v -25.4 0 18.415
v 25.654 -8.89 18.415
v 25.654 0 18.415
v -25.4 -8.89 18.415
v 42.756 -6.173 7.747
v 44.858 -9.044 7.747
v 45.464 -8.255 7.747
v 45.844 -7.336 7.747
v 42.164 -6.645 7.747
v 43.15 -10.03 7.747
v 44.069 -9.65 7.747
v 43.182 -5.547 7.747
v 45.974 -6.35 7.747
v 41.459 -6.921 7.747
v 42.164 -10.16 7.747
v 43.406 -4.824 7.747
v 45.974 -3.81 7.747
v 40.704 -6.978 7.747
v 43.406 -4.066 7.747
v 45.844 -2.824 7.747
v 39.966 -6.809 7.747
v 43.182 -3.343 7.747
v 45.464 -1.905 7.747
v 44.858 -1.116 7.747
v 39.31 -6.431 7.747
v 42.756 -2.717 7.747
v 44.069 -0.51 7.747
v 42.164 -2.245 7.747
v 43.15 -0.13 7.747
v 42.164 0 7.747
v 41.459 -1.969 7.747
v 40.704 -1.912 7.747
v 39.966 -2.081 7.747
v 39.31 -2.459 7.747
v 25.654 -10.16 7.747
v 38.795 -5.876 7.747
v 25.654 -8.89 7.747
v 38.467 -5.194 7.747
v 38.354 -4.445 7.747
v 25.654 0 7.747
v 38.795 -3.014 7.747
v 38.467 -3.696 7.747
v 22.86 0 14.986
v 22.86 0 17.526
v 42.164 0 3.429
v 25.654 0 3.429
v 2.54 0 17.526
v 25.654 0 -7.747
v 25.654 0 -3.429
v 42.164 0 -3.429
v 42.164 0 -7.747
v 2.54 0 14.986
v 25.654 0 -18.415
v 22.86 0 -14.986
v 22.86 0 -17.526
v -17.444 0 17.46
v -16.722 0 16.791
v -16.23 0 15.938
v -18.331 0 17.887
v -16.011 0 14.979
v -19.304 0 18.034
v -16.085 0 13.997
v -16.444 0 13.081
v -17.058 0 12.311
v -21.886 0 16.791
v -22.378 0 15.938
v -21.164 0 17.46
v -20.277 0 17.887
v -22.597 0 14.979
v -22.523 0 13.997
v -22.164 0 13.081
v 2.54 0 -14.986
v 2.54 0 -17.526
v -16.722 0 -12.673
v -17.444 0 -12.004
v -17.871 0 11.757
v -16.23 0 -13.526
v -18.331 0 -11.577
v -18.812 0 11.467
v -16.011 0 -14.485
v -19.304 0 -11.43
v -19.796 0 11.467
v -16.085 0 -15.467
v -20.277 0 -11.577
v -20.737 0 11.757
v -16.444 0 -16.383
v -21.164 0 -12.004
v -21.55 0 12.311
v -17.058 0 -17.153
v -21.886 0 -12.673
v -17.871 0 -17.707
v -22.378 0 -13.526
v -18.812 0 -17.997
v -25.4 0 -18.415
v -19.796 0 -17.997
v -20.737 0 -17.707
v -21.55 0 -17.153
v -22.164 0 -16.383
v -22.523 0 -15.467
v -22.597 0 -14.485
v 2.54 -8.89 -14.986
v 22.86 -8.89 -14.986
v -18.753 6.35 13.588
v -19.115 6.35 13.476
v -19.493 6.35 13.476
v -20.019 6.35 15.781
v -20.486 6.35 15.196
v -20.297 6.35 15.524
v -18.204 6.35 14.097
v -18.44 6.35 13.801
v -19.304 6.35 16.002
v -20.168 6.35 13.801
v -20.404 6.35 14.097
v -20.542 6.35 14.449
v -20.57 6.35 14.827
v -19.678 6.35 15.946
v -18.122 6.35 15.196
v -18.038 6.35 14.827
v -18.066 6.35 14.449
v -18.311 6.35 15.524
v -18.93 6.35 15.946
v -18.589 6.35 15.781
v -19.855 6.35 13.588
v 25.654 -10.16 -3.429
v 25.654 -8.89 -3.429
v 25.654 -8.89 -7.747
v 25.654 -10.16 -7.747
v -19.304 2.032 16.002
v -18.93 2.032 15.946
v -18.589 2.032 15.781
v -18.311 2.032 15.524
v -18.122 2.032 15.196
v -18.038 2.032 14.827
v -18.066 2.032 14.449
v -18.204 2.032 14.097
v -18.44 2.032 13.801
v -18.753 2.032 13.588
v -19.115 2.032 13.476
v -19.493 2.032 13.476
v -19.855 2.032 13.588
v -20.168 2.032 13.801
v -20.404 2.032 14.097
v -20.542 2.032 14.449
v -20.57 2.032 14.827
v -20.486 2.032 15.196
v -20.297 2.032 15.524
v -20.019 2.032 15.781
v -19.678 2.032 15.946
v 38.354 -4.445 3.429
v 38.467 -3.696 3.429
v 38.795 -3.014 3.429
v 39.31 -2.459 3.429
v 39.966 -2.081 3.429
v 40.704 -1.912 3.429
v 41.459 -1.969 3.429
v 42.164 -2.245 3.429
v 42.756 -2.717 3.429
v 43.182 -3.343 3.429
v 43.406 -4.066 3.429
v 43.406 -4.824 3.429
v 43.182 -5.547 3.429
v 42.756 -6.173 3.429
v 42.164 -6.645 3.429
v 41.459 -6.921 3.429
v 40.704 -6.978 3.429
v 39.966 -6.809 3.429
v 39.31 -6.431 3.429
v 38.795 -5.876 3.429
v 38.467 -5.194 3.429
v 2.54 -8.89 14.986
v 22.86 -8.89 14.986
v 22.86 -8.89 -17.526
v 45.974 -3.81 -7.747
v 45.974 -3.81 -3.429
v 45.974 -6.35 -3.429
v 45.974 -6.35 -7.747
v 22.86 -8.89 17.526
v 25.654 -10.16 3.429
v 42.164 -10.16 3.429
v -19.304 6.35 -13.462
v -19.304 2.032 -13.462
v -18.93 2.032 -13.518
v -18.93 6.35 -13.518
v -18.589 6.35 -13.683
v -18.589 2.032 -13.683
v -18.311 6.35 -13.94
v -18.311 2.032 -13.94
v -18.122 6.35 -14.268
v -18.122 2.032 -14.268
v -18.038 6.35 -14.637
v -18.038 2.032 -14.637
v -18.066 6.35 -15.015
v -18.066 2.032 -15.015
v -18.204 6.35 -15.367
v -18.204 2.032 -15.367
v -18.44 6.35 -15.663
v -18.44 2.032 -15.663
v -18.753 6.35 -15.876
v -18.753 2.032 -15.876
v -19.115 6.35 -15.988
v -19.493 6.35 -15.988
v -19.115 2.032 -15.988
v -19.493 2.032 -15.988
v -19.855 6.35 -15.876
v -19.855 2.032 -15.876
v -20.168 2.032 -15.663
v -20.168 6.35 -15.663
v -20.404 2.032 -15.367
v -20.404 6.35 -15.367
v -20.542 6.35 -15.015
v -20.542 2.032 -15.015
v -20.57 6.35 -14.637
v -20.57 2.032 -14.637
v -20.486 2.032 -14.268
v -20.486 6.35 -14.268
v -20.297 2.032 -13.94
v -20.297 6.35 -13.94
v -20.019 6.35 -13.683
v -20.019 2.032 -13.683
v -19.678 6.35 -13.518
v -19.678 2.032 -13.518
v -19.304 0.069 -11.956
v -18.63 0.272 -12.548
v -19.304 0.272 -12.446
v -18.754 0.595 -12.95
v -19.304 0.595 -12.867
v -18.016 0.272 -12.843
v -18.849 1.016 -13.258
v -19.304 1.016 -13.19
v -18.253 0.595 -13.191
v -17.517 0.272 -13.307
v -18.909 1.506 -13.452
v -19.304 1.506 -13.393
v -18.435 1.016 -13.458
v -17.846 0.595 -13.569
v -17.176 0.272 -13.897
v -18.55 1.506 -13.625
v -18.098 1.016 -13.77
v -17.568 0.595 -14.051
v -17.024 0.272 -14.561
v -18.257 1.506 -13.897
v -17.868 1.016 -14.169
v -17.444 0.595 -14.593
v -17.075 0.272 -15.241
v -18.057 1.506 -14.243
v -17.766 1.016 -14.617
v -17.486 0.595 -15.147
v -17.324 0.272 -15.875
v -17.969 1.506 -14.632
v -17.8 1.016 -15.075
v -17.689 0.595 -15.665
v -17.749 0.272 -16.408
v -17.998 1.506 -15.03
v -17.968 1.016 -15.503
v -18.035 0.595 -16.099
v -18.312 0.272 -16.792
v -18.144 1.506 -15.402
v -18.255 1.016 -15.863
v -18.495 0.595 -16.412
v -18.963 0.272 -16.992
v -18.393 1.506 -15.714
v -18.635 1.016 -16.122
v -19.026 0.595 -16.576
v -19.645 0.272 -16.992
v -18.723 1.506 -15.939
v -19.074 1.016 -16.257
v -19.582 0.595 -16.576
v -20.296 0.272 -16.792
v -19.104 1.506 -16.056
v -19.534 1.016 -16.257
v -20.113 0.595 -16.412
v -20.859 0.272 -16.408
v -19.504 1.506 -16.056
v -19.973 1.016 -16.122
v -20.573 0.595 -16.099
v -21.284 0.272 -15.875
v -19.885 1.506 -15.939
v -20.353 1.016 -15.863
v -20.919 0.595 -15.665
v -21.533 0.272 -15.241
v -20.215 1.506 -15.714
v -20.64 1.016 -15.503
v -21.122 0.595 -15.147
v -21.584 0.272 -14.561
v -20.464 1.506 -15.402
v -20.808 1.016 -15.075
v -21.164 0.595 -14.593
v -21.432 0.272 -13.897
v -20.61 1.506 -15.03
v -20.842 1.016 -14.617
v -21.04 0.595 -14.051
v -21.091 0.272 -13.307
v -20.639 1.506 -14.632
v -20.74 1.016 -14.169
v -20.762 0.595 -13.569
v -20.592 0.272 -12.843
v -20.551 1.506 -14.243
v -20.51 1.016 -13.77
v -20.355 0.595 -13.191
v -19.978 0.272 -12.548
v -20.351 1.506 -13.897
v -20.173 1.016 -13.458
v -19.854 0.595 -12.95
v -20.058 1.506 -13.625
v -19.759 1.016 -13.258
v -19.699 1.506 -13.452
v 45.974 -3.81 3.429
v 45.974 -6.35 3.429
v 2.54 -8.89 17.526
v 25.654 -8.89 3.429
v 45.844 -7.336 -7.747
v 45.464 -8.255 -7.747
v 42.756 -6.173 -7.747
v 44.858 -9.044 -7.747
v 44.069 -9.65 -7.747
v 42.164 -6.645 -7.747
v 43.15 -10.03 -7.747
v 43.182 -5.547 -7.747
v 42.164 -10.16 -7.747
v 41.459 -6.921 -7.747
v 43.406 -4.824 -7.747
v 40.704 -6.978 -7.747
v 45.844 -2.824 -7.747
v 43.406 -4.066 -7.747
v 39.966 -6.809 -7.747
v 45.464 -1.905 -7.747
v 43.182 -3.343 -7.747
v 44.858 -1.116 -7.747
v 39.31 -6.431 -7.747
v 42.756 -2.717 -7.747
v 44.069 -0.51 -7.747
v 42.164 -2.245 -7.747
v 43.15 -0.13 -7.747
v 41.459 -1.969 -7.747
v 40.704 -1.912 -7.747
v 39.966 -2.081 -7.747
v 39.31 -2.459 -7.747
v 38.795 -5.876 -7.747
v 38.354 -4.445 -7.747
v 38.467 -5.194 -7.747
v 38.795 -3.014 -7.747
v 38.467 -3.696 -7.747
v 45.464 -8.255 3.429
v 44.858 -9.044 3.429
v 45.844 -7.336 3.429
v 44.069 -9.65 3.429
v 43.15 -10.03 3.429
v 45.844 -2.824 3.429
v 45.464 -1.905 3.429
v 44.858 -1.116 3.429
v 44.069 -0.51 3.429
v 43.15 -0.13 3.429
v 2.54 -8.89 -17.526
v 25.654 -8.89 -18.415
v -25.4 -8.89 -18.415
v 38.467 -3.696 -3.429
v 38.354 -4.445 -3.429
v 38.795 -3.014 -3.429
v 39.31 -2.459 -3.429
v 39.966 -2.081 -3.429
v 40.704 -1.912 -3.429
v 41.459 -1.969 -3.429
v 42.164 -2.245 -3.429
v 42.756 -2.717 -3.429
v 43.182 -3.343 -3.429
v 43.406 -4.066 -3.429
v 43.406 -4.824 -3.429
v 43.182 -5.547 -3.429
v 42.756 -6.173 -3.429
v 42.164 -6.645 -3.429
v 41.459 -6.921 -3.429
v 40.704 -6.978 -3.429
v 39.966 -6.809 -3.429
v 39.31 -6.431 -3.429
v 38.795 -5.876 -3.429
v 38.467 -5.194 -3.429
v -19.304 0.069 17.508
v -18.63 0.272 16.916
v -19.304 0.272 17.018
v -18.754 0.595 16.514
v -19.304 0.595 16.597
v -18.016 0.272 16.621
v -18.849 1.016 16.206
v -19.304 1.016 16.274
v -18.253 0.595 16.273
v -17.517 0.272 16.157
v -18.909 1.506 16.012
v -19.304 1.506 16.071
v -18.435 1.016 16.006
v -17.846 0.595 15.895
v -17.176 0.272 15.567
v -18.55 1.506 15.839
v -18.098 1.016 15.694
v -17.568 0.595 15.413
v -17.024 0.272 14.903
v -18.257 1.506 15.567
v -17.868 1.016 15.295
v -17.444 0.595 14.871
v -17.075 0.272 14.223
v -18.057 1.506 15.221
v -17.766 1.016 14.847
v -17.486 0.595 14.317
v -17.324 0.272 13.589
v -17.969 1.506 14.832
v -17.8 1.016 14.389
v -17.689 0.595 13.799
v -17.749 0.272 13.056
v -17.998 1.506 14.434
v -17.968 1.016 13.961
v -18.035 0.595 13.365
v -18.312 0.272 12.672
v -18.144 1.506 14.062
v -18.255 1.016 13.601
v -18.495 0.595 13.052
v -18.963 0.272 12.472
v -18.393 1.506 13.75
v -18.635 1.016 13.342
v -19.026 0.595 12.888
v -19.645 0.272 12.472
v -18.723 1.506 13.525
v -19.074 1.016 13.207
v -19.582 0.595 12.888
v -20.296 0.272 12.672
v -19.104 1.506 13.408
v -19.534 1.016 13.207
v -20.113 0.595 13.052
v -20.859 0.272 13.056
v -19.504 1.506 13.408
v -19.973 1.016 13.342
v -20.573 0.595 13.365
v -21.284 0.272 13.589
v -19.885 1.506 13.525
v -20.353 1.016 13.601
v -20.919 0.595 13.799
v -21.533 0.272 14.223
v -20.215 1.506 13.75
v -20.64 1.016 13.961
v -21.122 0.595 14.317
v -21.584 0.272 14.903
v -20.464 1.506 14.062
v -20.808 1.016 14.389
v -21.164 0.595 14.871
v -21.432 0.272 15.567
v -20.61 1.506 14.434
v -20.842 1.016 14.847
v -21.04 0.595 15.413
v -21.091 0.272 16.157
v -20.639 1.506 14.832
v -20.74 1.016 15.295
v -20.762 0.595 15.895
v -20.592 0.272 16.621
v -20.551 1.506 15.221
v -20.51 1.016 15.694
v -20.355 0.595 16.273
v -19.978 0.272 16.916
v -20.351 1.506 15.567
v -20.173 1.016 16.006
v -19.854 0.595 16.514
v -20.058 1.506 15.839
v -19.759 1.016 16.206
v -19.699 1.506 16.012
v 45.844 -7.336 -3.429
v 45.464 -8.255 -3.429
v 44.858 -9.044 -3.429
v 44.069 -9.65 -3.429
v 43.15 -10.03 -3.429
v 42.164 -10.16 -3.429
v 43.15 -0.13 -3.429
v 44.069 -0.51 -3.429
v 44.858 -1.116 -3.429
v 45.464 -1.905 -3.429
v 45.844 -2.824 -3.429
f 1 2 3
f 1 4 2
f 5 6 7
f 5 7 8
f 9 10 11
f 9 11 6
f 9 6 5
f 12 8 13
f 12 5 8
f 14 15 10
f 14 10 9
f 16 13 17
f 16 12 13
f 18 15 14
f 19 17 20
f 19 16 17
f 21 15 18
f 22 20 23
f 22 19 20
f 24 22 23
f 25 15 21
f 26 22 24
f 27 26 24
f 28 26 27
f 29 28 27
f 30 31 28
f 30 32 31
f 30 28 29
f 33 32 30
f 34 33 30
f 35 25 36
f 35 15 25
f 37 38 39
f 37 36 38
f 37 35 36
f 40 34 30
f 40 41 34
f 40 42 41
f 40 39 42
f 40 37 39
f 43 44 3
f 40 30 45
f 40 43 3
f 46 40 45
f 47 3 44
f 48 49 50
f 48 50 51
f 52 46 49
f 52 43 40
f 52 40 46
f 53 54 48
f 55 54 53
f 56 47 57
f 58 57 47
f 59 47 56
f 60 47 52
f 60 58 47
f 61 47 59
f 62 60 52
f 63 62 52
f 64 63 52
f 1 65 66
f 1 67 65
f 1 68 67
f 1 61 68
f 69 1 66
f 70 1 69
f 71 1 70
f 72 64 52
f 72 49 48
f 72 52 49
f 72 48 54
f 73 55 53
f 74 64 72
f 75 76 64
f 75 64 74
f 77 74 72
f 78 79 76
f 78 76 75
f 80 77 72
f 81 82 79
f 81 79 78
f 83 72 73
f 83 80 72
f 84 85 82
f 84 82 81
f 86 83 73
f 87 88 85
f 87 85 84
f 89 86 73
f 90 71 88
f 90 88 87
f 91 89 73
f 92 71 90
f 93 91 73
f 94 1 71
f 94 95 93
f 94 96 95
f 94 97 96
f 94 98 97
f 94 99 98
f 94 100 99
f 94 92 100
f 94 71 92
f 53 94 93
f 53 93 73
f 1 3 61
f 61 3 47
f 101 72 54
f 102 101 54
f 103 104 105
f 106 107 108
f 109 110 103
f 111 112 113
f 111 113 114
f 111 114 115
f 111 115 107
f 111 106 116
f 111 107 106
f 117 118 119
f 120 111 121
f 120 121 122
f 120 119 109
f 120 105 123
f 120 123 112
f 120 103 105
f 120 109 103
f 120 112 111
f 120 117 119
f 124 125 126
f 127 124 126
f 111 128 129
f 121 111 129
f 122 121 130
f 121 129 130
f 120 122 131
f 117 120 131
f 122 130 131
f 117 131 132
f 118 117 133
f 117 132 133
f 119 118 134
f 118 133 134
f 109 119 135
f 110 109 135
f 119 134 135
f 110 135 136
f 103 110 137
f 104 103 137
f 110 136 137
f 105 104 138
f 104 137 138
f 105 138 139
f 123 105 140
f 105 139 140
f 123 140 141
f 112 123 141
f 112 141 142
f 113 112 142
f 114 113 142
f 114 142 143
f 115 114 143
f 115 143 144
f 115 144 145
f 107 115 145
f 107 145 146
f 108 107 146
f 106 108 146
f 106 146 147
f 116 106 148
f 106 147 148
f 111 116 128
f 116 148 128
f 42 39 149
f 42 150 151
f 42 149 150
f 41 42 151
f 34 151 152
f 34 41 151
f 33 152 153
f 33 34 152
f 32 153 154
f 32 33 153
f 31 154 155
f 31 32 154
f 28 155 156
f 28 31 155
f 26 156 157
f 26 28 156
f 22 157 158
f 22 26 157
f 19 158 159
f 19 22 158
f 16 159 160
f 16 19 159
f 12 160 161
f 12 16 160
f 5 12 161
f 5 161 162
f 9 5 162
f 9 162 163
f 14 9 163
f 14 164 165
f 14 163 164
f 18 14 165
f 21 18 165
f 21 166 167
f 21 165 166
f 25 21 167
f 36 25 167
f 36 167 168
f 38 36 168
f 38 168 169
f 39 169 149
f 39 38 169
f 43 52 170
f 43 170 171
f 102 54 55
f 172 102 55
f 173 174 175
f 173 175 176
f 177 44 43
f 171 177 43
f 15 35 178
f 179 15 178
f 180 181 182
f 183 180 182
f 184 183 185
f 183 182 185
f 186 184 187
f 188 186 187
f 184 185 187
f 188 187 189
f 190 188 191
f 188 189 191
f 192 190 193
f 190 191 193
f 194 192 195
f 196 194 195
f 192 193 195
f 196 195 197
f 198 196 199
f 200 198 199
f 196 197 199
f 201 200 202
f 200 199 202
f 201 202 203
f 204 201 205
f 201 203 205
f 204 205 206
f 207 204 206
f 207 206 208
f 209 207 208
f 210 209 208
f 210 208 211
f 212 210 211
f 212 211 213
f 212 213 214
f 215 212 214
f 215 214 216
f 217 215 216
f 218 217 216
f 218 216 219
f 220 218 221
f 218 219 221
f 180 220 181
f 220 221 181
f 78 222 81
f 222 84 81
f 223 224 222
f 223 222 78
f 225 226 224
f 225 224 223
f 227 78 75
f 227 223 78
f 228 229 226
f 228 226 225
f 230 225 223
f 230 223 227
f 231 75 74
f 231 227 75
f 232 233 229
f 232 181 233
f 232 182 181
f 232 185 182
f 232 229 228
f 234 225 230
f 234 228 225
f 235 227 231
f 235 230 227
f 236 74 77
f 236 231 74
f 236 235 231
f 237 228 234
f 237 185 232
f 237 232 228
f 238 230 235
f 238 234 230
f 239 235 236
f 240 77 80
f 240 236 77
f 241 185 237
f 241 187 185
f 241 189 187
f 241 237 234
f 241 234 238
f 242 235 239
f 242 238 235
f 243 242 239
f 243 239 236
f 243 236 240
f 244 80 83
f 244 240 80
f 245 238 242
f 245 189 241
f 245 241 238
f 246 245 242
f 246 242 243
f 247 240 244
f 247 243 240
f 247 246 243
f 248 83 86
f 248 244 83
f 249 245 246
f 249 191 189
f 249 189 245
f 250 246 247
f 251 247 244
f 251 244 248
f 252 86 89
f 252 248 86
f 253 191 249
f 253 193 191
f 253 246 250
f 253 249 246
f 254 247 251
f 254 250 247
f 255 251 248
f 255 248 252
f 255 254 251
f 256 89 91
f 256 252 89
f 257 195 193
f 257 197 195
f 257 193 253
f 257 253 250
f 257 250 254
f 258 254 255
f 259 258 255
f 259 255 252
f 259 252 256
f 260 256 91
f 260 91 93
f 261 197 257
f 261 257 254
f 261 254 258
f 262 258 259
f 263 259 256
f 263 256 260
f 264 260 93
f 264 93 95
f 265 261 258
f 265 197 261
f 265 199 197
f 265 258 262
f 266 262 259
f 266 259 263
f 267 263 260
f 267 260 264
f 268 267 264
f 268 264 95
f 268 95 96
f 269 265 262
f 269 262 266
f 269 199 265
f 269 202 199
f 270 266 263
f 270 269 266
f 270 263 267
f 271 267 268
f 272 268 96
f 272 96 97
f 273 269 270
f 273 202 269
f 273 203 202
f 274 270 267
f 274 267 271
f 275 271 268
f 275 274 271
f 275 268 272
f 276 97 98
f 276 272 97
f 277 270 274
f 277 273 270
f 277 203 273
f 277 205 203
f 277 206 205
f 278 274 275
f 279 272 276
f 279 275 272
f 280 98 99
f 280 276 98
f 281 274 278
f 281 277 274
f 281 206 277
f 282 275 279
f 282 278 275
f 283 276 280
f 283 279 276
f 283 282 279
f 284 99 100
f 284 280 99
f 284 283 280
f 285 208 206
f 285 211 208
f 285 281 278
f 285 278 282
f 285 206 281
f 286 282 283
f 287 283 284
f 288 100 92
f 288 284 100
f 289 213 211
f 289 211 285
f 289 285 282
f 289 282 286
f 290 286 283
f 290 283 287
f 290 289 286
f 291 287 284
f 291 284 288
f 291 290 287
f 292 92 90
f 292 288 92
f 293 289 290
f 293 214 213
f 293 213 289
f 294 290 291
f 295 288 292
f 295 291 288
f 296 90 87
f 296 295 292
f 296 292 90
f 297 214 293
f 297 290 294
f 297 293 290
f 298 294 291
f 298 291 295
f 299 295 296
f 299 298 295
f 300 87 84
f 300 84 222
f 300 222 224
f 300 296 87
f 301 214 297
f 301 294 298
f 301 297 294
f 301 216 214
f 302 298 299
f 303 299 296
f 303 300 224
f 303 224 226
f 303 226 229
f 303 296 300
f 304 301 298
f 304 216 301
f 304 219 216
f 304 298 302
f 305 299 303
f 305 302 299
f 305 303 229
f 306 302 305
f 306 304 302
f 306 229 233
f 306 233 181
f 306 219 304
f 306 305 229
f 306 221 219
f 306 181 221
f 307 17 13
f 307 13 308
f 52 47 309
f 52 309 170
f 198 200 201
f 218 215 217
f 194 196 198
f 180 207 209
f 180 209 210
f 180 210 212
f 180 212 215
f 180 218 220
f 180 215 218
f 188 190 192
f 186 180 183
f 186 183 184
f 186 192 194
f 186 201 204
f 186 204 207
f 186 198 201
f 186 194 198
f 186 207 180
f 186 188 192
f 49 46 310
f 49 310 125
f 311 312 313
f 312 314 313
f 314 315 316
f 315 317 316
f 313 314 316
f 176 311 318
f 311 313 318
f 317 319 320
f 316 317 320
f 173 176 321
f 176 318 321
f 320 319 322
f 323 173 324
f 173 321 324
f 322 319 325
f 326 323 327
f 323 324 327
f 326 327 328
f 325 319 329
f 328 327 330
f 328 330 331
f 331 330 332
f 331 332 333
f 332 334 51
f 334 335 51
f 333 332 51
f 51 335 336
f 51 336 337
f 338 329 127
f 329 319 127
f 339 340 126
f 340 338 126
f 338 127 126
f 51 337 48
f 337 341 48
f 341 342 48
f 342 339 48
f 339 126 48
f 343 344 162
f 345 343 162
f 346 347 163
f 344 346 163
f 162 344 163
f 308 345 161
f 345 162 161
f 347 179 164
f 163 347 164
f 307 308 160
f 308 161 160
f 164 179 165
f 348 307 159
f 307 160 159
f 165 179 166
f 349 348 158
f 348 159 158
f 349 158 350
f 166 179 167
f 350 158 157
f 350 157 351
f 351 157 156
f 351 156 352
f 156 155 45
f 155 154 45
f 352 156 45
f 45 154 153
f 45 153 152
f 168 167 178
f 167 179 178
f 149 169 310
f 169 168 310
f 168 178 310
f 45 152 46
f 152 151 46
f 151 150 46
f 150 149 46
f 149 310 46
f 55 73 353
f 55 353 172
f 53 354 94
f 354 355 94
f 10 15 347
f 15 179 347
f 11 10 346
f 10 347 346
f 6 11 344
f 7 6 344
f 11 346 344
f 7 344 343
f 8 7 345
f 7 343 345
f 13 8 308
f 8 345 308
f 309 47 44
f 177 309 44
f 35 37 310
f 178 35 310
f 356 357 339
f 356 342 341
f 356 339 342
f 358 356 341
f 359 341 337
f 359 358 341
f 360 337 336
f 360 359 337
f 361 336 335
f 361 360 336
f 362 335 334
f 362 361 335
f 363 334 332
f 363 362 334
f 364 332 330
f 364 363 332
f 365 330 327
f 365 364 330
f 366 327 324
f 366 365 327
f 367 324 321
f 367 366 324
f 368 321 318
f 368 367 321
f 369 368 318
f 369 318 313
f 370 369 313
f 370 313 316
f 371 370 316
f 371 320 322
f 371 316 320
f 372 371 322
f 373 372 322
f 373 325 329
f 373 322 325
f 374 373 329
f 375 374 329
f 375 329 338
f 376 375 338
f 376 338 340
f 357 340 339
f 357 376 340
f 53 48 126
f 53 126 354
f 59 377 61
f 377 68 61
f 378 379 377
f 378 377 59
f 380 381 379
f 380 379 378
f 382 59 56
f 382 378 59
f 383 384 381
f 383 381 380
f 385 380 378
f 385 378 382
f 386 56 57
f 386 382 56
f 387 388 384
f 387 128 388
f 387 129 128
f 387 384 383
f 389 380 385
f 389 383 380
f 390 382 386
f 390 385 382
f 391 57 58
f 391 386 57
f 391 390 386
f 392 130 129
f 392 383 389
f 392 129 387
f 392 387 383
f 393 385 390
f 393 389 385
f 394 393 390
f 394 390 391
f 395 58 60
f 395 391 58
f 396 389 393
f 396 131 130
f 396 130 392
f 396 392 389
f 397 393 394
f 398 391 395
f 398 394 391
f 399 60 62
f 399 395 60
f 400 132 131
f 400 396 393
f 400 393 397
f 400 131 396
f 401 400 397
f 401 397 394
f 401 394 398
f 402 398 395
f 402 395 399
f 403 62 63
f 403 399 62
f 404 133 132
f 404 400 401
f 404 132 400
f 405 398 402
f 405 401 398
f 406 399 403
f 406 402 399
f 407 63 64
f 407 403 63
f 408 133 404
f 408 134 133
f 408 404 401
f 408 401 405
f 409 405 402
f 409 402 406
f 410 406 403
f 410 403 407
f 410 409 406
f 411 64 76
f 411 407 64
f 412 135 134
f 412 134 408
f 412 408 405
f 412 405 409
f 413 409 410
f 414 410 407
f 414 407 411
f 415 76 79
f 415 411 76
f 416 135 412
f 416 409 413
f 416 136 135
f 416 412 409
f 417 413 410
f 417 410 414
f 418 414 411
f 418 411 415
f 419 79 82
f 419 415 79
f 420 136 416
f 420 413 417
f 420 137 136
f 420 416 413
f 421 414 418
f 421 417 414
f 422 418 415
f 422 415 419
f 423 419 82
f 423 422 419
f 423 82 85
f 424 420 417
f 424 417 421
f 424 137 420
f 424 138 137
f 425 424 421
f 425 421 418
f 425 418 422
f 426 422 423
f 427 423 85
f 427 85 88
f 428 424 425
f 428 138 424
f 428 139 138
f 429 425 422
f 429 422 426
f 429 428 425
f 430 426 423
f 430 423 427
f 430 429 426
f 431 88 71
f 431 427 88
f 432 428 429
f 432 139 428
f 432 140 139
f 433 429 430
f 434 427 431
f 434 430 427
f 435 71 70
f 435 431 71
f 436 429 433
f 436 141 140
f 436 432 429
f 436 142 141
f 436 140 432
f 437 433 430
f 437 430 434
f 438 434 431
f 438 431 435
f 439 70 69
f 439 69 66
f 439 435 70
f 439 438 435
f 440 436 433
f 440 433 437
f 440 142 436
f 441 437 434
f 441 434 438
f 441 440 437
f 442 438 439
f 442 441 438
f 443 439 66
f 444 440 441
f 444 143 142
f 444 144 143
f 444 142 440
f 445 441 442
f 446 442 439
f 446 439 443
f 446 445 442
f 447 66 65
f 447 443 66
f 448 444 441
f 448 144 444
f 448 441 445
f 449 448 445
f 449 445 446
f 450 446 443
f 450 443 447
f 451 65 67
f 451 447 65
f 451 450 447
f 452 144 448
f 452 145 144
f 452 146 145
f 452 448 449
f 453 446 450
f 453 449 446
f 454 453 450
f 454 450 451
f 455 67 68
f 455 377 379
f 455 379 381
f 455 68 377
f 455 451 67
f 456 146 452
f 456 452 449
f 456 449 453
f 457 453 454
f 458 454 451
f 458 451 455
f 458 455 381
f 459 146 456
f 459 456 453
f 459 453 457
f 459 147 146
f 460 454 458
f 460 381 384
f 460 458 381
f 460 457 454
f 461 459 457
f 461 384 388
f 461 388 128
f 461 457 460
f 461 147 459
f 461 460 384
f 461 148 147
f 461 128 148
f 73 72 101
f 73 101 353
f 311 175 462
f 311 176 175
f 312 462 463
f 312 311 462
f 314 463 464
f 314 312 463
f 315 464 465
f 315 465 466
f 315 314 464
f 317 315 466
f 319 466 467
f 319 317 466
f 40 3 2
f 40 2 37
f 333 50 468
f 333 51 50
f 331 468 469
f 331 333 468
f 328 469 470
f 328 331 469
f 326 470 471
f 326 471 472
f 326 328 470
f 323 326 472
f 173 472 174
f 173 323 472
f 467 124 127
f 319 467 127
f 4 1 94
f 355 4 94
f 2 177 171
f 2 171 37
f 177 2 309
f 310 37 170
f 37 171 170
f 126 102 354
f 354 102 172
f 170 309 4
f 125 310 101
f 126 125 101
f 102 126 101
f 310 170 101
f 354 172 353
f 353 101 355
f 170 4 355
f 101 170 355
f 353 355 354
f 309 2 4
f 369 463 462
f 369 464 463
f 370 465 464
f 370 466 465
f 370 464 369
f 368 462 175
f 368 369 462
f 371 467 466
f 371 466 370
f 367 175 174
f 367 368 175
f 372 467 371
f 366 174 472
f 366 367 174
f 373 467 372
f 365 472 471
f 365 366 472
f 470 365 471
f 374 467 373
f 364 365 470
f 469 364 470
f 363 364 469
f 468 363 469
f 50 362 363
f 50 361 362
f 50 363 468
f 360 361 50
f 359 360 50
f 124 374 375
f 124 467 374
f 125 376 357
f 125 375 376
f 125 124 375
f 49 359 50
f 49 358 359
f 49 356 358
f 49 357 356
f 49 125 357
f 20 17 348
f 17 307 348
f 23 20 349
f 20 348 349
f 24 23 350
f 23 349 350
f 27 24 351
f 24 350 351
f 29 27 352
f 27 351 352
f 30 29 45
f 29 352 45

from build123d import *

# Parameters (mm, degrees)
SKETCH1_W               = 50.8
SKETCH1_H               = 36.83
BOSS_EXTRUDE1_DEPTH     = 8.89
SKETCH2_W               = 36.83
SKETCH2_H               = 8.89
BOSS_EXTRUDE2_DEPTH     = 0.254
SKETCH3_W               = 4.318
SKETCH3_H               = 10.16
BOSS_EXTRUDE3_DEPTH     = 20.32
CUT_EXTRUDE1_DEPTH      = 54.86357322
CUT_EXTRUDE1_DEPTH_BACK = 54.86357322
SKETCH4_R               = 2.54
FILLET1_R               = 3.81
SKETCH18_5_W            = 20.32
SKETCH18_5_H            = 2.54
CUT_EXTRUDE2_DEPTH      = 51.556369539
SKETCH7_W               = 20.32
SKETCH7_H               = 2.54
CUT_EXTRUDE3_DEPTH      = 51.556369539
SKETCH18_16_R           = 1.27
BOSS_EXTRUDE4_DEPTH     = 6.35
FILLET2_R               = 2.032


with BuildPart() as part:
    # Sketch1 → Boss-Extrude1 (new body)
    with BuildSketch(Plane(origin=(0, 0, 0), x_dir=(1, 0, 0), z_dir=(0, 1, 0))):
        Rectangle(SKETCH1_W, SKETCH1_H)
    extrude(amount=-BOSS_EXTRUDE1_DEPTH)

    # Sketch2 → Boss-Extrude2 (add)
    with BuildSketch(Plane(origin=(25.4, 0, 0), x_dir=(0, 0, -1), z_dir=(1, 0, 0))):
        with Locations((0, -4.445)):
            Rectangle(SKETCH2_W, SKETCH2_H)
    extrude(amount=BOSS_EXTRUDE2_DEPTH)

    # Sketch3 → Boss-Extrude3 (add)
    with BuildSketch(Plane(origin=(25.654, 0, 0), x_dir=(0, 0, -1), z_dir=(1, 0, 0))):
        with Locations((-5.588, -5.08)):
            Rectangle(SKETCH3_W, SKETCH3_H)
        with Locations((5.588, -5.08)):
            Rectangle(SKETCH3_W, SKETCH3_H)
    extrude(amount=BOSS_EXTRUDE3_DEPTH)

    # Sketch4 → Cut-Extrude1 (cut, two sides: drawn at the far end of the back side and taken through both)
    with BuildSketch(Plane(origin=(0, 0, -7.747), x_dir=(-1, 0, 0), z_dir=(0, 0, -1)).offset(-CUT_EXTRUDE1_DEPTH_BACK)):
        with Locations((-40.894, -4.445)):
            Circle(SKETCH4_R)
    extrude(amount=CUT_EXTRUDE1_DEPTH + CUT_EXTRUDE1_DEPTH_BACK, mode=Mode.SUBTRACT)

    # Fillet1
    fillet1_edges = [part.edges().sort_by_distance(p)[0] for p in [
        (45.974, 0, 5.588),
        (45.974, -10.16, 5.588),
        (45.974, 0, -5.588),
        (45.974, -10.16, -5.588),
    ]]
    fillet(fillet1_edges, radius=FILLET1_R)

    # Sketch18<5> → Cut-Extrude2 (cut, through all)
    with BuildSketch(Plane(origin=(0, 0, 0), x_dir=(1, 0, 0), z_dir=(0, 1, 0))):
        with Locations((12.7, 16.256)):
            Rectangle(SKETCH18_5_W, SKETCH18_5_H)
    extrude(amount=-CUT_EXTRUDE2_DEPTH, mode=Mode.SUBTRACT)

    # Sketch7 → Cut-Extrude3 (cut, through all)
    with BuildSketch(Plane(origin=(0, 0, 0), x_dir=(1, 0, 0), z_dir=(0, 1, 0))):
        with Locations((12.7, -16.256)):
            Rectangle(SKETCH7_W, SKETCH7_H)
    extrude(amount=-CUT_EXTRUDE3_DEPTH, mode=Mode.SUBTRACT)

    # Sketch18<16> → Boss-Extrude4 (add)
    with BuildSketch(Plane(origin=(0, 0, 0), x_dir=(1, 0, 0), z_dir=(0, 1, 0))):
        with Locations((-19.304, -14.732)):
            Circle(SKETCH18_16_R)
        with Locations((-19.304, 14.732)):
            Circle(SKETCH18_16_R)
    extrude(amount=BOSS_EXTRUDE4_DEPTH)

    # Fillet2
    fillet2_edges = [part.edges().sort_by_distance(p)[0] for p in [
        (-20.574, 0, -14.732),
        (-20.574, 0, 14.732),
    ]]
    fillet(fillet2_edges, radius=FILLET2_R)


solid = part.part
